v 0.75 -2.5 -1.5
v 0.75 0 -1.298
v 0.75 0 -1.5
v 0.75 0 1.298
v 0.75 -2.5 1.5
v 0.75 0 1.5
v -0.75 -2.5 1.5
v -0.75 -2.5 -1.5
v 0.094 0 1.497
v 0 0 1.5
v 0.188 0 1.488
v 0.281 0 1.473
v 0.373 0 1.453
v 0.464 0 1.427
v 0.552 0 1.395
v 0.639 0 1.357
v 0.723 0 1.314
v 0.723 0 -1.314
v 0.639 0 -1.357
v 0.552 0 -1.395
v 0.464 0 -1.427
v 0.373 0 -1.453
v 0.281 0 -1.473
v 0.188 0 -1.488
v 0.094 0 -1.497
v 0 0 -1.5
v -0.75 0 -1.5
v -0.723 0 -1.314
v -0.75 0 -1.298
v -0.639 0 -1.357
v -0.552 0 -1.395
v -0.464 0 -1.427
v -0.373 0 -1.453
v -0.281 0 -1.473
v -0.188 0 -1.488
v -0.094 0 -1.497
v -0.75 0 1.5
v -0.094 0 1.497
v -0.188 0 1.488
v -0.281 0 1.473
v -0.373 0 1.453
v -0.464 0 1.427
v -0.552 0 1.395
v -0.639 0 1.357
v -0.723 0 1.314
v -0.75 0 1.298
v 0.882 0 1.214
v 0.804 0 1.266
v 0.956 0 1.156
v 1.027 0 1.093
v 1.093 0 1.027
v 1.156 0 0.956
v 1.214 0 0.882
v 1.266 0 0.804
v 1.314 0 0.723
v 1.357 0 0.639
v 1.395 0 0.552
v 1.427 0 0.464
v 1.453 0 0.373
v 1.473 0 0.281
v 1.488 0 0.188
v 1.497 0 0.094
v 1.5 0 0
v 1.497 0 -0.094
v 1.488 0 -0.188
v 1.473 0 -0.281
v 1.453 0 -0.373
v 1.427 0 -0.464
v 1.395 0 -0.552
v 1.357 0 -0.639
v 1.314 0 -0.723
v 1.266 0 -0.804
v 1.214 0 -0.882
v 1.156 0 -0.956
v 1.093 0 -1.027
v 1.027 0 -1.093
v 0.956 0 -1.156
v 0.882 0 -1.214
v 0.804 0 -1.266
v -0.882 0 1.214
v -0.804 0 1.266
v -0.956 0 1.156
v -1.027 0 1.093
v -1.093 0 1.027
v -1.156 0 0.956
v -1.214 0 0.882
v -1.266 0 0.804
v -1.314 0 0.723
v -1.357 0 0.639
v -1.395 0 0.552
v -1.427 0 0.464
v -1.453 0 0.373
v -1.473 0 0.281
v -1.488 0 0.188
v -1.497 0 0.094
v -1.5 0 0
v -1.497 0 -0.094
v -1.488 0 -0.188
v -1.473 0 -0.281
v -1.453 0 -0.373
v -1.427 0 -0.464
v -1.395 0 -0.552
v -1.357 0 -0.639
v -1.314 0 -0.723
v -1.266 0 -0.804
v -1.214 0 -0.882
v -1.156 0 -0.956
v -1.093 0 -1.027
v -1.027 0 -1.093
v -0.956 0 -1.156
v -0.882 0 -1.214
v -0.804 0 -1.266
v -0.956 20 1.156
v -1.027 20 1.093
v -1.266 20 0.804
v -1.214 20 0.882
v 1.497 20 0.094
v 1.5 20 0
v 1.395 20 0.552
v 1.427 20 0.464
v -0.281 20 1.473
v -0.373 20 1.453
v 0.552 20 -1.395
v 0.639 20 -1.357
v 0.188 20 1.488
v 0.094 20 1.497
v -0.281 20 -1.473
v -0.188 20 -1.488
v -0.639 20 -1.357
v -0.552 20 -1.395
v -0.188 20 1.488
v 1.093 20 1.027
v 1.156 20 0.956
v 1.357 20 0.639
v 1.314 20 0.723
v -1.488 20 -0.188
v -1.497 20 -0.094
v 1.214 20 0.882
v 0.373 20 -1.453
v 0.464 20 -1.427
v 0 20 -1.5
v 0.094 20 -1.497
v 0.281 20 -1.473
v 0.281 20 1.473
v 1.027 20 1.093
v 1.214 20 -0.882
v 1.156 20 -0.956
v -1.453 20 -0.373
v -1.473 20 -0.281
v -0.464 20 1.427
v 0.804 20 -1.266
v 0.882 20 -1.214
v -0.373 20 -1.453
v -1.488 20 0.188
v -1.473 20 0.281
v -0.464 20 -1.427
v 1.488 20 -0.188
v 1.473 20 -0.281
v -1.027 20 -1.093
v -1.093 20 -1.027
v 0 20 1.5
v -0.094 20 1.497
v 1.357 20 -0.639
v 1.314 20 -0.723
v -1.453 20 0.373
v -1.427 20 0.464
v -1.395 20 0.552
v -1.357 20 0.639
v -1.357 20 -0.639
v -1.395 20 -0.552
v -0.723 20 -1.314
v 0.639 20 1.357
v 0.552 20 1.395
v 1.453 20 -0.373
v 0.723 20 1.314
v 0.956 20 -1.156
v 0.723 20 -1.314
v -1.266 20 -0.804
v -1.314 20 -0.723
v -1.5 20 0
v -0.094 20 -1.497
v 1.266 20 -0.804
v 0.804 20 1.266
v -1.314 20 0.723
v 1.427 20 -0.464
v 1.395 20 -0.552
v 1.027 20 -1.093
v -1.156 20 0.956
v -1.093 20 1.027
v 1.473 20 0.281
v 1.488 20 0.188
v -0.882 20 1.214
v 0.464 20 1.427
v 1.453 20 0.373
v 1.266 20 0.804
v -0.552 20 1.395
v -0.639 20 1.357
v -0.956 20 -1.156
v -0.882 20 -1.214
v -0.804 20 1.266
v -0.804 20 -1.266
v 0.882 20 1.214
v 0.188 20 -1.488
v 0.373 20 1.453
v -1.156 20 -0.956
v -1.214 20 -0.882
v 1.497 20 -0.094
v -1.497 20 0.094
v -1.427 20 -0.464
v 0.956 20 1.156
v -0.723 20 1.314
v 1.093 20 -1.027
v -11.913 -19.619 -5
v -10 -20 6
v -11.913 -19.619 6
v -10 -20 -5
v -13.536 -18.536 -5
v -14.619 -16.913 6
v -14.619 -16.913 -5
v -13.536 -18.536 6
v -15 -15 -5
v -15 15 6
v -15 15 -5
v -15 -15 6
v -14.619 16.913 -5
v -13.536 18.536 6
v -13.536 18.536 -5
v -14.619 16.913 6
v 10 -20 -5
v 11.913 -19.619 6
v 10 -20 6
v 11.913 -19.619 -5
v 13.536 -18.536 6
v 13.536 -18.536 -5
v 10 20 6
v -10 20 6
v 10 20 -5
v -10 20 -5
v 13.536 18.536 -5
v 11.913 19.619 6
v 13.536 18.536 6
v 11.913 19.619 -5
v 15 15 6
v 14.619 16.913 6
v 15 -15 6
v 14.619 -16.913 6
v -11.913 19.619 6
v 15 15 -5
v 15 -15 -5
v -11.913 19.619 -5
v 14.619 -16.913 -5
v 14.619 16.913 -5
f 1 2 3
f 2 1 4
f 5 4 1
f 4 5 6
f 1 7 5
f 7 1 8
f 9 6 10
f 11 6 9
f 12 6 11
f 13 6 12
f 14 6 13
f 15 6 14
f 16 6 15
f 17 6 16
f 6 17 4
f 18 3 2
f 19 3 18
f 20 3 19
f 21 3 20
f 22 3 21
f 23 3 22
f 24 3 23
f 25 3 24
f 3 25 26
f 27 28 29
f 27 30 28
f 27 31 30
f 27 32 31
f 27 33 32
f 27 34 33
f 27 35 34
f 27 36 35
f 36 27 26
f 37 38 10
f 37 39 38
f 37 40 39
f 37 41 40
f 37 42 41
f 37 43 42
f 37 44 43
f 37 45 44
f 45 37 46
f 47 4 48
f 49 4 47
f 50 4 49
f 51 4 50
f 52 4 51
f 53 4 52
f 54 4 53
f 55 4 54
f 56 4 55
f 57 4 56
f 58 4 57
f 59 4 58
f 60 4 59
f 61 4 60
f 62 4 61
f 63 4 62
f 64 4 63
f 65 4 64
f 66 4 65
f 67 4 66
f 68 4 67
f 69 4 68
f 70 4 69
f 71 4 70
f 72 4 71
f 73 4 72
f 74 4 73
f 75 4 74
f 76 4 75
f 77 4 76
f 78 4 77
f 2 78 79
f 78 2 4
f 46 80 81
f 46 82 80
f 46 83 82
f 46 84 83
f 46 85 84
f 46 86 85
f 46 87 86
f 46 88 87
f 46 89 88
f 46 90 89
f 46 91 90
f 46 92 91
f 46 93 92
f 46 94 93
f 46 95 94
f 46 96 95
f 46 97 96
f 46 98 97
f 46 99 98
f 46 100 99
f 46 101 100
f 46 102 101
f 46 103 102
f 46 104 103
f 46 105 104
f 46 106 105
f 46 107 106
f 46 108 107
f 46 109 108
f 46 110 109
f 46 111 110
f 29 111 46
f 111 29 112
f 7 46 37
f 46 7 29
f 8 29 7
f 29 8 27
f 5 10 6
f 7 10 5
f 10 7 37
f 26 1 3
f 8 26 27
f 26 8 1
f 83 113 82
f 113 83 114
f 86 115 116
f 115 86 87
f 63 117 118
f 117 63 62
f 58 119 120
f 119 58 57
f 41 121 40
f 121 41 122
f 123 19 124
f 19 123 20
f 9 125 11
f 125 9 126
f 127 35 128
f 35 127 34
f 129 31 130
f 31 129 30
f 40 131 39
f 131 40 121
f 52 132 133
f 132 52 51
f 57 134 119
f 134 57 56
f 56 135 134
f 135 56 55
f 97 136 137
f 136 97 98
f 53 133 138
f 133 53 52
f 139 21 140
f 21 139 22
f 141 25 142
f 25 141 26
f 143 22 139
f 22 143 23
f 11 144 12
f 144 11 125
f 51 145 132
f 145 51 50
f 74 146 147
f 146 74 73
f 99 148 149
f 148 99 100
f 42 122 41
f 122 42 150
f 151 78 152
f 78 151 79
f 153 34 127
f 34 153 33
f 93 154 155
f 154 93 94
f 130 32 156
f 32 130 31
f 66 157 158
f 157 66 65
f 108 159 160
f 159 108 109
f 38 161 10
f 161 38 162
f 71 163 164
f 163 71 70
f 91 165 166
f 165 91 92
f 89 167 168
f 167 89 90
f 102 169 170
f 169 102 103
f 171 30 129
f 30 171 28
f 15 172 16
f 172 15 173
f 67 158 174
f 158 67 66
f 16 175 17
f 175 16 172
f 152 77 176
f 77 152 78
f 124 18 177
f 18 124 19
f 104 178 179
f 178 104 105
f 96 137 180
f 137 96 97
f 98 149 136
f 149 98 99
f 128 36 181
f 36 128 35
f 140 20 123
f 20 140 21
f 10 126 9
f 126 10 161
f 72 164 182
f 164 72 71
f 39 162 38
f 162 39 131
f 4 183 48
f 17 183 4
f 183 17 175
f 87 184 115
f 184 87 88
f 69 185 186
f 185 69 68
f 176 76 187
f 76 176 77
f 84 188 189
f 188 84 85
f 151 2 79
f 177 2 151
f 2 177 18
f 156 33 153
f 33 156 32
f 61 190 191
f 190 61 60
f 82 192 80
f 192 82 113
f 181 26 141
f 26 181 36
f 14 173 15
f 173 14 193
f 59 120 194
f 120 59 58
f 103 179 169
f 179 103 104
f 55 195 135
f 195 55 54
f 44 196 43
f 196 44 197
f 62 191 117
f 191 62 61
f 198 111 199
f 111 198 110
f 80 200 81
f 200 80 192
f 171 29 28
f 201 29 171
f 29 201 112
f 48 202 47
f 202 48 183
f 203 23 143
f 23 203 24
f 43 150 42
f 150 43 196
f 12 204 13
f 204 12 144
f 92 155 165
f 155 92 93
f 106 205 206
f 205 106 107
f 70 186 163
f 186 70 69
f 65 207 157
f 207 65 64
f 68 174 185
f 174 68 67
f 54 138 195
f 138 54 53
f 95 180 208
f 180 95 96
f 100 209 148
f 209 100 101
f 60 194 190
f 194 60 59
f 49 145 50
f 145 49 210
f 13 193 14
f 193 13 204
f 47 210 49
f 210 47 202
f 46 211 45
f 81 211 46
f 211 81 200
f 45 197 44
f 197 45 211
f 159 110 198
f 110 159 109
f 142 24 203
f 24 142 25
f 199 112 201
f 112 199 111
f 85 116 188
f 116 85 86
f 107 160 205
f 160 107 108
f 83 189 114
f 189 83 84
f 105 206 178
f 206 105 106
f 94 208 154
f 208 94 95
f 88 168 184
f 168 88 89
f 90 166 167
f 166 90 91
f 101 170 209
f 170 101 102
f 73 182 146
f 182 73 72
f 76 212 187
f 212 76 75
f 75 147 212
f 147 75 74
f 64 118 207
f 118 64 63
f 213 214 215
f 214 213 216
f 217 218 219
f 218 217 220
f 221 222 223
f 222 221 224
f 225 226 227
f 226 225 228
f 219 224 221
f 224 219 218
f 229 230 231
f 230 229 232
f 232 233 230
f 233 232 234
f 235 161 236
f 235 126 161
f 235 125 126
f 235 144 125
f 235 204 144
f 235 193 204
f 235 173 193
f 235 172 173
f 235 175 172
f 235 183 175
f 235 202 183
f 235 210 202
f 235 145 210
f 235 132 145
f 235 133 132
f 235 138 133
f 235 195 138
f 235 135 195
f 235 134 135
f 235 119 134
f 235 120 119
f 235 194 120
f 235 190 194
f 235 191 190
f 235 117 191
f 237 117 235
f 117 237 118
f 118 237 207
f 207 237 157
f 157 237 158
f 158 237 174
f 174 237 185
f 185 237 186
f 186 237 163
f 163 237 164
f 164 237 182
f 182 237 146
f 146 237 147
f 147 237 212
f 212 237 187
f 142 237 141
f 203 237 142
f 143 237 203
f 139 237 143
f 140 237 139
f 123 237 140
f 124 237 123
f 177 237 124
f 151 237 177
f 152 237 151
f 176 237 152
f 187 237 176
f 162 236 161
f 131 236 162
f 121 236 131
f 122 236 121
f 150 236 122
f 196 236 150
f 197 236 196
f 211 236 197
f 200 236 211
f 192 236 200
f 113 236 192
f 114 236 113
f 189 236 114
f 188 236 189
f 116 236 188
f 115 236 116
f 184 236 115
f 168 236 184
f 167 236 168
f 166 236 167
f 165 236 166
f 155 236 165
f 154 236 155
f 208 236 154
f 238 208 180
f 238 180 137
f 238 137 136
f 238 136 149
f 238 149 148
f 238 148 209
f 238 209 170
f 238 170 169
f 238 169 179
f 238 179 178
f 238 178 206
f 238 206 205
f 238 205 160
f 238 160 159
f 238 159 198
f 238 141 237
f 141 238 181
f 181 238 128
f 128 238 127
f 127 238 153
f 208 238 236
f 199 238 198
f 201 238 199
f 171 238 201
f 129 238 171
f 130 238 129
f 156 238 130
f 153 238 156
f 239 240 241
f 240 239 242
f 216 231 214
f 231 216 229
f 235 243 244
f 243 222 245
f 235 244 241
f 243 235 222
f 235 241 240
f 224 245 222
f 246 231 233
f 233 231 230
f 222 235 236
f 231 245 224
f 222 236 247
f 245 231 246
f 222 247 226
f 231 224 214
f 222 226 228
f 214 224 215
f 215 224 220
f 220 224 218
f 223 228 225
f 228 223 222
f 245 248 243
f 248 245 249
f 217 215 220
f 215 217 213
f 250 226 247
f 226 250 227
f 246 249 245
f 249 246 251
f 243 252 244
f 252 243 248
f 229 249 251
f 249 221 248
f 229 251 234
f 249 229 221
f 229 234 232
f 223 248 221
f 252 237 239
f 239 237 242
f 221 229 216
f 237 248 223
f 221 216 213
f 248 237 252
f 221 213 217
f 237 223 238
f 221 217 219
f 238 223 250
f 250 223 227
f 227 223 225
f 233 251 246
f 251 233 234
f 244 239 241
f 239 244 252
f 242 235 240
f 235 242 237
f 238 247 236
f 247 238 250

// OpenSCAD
//Handle for a tiny screwdriver I found in an unlabeled box.
difference(){
	translate([20,30,10]/-2) minkowski(){
		cube([20,30,10]);
		cylinder(r=5);
	}
	rotate([90,0,0]) union(){
		translate([0,0,2.5/2]) cube([1.5,3,2.5],center=true);
		mirror([0,0,1]) cylinder(r=3/2,h=9000,$fn=100);
	}
}
